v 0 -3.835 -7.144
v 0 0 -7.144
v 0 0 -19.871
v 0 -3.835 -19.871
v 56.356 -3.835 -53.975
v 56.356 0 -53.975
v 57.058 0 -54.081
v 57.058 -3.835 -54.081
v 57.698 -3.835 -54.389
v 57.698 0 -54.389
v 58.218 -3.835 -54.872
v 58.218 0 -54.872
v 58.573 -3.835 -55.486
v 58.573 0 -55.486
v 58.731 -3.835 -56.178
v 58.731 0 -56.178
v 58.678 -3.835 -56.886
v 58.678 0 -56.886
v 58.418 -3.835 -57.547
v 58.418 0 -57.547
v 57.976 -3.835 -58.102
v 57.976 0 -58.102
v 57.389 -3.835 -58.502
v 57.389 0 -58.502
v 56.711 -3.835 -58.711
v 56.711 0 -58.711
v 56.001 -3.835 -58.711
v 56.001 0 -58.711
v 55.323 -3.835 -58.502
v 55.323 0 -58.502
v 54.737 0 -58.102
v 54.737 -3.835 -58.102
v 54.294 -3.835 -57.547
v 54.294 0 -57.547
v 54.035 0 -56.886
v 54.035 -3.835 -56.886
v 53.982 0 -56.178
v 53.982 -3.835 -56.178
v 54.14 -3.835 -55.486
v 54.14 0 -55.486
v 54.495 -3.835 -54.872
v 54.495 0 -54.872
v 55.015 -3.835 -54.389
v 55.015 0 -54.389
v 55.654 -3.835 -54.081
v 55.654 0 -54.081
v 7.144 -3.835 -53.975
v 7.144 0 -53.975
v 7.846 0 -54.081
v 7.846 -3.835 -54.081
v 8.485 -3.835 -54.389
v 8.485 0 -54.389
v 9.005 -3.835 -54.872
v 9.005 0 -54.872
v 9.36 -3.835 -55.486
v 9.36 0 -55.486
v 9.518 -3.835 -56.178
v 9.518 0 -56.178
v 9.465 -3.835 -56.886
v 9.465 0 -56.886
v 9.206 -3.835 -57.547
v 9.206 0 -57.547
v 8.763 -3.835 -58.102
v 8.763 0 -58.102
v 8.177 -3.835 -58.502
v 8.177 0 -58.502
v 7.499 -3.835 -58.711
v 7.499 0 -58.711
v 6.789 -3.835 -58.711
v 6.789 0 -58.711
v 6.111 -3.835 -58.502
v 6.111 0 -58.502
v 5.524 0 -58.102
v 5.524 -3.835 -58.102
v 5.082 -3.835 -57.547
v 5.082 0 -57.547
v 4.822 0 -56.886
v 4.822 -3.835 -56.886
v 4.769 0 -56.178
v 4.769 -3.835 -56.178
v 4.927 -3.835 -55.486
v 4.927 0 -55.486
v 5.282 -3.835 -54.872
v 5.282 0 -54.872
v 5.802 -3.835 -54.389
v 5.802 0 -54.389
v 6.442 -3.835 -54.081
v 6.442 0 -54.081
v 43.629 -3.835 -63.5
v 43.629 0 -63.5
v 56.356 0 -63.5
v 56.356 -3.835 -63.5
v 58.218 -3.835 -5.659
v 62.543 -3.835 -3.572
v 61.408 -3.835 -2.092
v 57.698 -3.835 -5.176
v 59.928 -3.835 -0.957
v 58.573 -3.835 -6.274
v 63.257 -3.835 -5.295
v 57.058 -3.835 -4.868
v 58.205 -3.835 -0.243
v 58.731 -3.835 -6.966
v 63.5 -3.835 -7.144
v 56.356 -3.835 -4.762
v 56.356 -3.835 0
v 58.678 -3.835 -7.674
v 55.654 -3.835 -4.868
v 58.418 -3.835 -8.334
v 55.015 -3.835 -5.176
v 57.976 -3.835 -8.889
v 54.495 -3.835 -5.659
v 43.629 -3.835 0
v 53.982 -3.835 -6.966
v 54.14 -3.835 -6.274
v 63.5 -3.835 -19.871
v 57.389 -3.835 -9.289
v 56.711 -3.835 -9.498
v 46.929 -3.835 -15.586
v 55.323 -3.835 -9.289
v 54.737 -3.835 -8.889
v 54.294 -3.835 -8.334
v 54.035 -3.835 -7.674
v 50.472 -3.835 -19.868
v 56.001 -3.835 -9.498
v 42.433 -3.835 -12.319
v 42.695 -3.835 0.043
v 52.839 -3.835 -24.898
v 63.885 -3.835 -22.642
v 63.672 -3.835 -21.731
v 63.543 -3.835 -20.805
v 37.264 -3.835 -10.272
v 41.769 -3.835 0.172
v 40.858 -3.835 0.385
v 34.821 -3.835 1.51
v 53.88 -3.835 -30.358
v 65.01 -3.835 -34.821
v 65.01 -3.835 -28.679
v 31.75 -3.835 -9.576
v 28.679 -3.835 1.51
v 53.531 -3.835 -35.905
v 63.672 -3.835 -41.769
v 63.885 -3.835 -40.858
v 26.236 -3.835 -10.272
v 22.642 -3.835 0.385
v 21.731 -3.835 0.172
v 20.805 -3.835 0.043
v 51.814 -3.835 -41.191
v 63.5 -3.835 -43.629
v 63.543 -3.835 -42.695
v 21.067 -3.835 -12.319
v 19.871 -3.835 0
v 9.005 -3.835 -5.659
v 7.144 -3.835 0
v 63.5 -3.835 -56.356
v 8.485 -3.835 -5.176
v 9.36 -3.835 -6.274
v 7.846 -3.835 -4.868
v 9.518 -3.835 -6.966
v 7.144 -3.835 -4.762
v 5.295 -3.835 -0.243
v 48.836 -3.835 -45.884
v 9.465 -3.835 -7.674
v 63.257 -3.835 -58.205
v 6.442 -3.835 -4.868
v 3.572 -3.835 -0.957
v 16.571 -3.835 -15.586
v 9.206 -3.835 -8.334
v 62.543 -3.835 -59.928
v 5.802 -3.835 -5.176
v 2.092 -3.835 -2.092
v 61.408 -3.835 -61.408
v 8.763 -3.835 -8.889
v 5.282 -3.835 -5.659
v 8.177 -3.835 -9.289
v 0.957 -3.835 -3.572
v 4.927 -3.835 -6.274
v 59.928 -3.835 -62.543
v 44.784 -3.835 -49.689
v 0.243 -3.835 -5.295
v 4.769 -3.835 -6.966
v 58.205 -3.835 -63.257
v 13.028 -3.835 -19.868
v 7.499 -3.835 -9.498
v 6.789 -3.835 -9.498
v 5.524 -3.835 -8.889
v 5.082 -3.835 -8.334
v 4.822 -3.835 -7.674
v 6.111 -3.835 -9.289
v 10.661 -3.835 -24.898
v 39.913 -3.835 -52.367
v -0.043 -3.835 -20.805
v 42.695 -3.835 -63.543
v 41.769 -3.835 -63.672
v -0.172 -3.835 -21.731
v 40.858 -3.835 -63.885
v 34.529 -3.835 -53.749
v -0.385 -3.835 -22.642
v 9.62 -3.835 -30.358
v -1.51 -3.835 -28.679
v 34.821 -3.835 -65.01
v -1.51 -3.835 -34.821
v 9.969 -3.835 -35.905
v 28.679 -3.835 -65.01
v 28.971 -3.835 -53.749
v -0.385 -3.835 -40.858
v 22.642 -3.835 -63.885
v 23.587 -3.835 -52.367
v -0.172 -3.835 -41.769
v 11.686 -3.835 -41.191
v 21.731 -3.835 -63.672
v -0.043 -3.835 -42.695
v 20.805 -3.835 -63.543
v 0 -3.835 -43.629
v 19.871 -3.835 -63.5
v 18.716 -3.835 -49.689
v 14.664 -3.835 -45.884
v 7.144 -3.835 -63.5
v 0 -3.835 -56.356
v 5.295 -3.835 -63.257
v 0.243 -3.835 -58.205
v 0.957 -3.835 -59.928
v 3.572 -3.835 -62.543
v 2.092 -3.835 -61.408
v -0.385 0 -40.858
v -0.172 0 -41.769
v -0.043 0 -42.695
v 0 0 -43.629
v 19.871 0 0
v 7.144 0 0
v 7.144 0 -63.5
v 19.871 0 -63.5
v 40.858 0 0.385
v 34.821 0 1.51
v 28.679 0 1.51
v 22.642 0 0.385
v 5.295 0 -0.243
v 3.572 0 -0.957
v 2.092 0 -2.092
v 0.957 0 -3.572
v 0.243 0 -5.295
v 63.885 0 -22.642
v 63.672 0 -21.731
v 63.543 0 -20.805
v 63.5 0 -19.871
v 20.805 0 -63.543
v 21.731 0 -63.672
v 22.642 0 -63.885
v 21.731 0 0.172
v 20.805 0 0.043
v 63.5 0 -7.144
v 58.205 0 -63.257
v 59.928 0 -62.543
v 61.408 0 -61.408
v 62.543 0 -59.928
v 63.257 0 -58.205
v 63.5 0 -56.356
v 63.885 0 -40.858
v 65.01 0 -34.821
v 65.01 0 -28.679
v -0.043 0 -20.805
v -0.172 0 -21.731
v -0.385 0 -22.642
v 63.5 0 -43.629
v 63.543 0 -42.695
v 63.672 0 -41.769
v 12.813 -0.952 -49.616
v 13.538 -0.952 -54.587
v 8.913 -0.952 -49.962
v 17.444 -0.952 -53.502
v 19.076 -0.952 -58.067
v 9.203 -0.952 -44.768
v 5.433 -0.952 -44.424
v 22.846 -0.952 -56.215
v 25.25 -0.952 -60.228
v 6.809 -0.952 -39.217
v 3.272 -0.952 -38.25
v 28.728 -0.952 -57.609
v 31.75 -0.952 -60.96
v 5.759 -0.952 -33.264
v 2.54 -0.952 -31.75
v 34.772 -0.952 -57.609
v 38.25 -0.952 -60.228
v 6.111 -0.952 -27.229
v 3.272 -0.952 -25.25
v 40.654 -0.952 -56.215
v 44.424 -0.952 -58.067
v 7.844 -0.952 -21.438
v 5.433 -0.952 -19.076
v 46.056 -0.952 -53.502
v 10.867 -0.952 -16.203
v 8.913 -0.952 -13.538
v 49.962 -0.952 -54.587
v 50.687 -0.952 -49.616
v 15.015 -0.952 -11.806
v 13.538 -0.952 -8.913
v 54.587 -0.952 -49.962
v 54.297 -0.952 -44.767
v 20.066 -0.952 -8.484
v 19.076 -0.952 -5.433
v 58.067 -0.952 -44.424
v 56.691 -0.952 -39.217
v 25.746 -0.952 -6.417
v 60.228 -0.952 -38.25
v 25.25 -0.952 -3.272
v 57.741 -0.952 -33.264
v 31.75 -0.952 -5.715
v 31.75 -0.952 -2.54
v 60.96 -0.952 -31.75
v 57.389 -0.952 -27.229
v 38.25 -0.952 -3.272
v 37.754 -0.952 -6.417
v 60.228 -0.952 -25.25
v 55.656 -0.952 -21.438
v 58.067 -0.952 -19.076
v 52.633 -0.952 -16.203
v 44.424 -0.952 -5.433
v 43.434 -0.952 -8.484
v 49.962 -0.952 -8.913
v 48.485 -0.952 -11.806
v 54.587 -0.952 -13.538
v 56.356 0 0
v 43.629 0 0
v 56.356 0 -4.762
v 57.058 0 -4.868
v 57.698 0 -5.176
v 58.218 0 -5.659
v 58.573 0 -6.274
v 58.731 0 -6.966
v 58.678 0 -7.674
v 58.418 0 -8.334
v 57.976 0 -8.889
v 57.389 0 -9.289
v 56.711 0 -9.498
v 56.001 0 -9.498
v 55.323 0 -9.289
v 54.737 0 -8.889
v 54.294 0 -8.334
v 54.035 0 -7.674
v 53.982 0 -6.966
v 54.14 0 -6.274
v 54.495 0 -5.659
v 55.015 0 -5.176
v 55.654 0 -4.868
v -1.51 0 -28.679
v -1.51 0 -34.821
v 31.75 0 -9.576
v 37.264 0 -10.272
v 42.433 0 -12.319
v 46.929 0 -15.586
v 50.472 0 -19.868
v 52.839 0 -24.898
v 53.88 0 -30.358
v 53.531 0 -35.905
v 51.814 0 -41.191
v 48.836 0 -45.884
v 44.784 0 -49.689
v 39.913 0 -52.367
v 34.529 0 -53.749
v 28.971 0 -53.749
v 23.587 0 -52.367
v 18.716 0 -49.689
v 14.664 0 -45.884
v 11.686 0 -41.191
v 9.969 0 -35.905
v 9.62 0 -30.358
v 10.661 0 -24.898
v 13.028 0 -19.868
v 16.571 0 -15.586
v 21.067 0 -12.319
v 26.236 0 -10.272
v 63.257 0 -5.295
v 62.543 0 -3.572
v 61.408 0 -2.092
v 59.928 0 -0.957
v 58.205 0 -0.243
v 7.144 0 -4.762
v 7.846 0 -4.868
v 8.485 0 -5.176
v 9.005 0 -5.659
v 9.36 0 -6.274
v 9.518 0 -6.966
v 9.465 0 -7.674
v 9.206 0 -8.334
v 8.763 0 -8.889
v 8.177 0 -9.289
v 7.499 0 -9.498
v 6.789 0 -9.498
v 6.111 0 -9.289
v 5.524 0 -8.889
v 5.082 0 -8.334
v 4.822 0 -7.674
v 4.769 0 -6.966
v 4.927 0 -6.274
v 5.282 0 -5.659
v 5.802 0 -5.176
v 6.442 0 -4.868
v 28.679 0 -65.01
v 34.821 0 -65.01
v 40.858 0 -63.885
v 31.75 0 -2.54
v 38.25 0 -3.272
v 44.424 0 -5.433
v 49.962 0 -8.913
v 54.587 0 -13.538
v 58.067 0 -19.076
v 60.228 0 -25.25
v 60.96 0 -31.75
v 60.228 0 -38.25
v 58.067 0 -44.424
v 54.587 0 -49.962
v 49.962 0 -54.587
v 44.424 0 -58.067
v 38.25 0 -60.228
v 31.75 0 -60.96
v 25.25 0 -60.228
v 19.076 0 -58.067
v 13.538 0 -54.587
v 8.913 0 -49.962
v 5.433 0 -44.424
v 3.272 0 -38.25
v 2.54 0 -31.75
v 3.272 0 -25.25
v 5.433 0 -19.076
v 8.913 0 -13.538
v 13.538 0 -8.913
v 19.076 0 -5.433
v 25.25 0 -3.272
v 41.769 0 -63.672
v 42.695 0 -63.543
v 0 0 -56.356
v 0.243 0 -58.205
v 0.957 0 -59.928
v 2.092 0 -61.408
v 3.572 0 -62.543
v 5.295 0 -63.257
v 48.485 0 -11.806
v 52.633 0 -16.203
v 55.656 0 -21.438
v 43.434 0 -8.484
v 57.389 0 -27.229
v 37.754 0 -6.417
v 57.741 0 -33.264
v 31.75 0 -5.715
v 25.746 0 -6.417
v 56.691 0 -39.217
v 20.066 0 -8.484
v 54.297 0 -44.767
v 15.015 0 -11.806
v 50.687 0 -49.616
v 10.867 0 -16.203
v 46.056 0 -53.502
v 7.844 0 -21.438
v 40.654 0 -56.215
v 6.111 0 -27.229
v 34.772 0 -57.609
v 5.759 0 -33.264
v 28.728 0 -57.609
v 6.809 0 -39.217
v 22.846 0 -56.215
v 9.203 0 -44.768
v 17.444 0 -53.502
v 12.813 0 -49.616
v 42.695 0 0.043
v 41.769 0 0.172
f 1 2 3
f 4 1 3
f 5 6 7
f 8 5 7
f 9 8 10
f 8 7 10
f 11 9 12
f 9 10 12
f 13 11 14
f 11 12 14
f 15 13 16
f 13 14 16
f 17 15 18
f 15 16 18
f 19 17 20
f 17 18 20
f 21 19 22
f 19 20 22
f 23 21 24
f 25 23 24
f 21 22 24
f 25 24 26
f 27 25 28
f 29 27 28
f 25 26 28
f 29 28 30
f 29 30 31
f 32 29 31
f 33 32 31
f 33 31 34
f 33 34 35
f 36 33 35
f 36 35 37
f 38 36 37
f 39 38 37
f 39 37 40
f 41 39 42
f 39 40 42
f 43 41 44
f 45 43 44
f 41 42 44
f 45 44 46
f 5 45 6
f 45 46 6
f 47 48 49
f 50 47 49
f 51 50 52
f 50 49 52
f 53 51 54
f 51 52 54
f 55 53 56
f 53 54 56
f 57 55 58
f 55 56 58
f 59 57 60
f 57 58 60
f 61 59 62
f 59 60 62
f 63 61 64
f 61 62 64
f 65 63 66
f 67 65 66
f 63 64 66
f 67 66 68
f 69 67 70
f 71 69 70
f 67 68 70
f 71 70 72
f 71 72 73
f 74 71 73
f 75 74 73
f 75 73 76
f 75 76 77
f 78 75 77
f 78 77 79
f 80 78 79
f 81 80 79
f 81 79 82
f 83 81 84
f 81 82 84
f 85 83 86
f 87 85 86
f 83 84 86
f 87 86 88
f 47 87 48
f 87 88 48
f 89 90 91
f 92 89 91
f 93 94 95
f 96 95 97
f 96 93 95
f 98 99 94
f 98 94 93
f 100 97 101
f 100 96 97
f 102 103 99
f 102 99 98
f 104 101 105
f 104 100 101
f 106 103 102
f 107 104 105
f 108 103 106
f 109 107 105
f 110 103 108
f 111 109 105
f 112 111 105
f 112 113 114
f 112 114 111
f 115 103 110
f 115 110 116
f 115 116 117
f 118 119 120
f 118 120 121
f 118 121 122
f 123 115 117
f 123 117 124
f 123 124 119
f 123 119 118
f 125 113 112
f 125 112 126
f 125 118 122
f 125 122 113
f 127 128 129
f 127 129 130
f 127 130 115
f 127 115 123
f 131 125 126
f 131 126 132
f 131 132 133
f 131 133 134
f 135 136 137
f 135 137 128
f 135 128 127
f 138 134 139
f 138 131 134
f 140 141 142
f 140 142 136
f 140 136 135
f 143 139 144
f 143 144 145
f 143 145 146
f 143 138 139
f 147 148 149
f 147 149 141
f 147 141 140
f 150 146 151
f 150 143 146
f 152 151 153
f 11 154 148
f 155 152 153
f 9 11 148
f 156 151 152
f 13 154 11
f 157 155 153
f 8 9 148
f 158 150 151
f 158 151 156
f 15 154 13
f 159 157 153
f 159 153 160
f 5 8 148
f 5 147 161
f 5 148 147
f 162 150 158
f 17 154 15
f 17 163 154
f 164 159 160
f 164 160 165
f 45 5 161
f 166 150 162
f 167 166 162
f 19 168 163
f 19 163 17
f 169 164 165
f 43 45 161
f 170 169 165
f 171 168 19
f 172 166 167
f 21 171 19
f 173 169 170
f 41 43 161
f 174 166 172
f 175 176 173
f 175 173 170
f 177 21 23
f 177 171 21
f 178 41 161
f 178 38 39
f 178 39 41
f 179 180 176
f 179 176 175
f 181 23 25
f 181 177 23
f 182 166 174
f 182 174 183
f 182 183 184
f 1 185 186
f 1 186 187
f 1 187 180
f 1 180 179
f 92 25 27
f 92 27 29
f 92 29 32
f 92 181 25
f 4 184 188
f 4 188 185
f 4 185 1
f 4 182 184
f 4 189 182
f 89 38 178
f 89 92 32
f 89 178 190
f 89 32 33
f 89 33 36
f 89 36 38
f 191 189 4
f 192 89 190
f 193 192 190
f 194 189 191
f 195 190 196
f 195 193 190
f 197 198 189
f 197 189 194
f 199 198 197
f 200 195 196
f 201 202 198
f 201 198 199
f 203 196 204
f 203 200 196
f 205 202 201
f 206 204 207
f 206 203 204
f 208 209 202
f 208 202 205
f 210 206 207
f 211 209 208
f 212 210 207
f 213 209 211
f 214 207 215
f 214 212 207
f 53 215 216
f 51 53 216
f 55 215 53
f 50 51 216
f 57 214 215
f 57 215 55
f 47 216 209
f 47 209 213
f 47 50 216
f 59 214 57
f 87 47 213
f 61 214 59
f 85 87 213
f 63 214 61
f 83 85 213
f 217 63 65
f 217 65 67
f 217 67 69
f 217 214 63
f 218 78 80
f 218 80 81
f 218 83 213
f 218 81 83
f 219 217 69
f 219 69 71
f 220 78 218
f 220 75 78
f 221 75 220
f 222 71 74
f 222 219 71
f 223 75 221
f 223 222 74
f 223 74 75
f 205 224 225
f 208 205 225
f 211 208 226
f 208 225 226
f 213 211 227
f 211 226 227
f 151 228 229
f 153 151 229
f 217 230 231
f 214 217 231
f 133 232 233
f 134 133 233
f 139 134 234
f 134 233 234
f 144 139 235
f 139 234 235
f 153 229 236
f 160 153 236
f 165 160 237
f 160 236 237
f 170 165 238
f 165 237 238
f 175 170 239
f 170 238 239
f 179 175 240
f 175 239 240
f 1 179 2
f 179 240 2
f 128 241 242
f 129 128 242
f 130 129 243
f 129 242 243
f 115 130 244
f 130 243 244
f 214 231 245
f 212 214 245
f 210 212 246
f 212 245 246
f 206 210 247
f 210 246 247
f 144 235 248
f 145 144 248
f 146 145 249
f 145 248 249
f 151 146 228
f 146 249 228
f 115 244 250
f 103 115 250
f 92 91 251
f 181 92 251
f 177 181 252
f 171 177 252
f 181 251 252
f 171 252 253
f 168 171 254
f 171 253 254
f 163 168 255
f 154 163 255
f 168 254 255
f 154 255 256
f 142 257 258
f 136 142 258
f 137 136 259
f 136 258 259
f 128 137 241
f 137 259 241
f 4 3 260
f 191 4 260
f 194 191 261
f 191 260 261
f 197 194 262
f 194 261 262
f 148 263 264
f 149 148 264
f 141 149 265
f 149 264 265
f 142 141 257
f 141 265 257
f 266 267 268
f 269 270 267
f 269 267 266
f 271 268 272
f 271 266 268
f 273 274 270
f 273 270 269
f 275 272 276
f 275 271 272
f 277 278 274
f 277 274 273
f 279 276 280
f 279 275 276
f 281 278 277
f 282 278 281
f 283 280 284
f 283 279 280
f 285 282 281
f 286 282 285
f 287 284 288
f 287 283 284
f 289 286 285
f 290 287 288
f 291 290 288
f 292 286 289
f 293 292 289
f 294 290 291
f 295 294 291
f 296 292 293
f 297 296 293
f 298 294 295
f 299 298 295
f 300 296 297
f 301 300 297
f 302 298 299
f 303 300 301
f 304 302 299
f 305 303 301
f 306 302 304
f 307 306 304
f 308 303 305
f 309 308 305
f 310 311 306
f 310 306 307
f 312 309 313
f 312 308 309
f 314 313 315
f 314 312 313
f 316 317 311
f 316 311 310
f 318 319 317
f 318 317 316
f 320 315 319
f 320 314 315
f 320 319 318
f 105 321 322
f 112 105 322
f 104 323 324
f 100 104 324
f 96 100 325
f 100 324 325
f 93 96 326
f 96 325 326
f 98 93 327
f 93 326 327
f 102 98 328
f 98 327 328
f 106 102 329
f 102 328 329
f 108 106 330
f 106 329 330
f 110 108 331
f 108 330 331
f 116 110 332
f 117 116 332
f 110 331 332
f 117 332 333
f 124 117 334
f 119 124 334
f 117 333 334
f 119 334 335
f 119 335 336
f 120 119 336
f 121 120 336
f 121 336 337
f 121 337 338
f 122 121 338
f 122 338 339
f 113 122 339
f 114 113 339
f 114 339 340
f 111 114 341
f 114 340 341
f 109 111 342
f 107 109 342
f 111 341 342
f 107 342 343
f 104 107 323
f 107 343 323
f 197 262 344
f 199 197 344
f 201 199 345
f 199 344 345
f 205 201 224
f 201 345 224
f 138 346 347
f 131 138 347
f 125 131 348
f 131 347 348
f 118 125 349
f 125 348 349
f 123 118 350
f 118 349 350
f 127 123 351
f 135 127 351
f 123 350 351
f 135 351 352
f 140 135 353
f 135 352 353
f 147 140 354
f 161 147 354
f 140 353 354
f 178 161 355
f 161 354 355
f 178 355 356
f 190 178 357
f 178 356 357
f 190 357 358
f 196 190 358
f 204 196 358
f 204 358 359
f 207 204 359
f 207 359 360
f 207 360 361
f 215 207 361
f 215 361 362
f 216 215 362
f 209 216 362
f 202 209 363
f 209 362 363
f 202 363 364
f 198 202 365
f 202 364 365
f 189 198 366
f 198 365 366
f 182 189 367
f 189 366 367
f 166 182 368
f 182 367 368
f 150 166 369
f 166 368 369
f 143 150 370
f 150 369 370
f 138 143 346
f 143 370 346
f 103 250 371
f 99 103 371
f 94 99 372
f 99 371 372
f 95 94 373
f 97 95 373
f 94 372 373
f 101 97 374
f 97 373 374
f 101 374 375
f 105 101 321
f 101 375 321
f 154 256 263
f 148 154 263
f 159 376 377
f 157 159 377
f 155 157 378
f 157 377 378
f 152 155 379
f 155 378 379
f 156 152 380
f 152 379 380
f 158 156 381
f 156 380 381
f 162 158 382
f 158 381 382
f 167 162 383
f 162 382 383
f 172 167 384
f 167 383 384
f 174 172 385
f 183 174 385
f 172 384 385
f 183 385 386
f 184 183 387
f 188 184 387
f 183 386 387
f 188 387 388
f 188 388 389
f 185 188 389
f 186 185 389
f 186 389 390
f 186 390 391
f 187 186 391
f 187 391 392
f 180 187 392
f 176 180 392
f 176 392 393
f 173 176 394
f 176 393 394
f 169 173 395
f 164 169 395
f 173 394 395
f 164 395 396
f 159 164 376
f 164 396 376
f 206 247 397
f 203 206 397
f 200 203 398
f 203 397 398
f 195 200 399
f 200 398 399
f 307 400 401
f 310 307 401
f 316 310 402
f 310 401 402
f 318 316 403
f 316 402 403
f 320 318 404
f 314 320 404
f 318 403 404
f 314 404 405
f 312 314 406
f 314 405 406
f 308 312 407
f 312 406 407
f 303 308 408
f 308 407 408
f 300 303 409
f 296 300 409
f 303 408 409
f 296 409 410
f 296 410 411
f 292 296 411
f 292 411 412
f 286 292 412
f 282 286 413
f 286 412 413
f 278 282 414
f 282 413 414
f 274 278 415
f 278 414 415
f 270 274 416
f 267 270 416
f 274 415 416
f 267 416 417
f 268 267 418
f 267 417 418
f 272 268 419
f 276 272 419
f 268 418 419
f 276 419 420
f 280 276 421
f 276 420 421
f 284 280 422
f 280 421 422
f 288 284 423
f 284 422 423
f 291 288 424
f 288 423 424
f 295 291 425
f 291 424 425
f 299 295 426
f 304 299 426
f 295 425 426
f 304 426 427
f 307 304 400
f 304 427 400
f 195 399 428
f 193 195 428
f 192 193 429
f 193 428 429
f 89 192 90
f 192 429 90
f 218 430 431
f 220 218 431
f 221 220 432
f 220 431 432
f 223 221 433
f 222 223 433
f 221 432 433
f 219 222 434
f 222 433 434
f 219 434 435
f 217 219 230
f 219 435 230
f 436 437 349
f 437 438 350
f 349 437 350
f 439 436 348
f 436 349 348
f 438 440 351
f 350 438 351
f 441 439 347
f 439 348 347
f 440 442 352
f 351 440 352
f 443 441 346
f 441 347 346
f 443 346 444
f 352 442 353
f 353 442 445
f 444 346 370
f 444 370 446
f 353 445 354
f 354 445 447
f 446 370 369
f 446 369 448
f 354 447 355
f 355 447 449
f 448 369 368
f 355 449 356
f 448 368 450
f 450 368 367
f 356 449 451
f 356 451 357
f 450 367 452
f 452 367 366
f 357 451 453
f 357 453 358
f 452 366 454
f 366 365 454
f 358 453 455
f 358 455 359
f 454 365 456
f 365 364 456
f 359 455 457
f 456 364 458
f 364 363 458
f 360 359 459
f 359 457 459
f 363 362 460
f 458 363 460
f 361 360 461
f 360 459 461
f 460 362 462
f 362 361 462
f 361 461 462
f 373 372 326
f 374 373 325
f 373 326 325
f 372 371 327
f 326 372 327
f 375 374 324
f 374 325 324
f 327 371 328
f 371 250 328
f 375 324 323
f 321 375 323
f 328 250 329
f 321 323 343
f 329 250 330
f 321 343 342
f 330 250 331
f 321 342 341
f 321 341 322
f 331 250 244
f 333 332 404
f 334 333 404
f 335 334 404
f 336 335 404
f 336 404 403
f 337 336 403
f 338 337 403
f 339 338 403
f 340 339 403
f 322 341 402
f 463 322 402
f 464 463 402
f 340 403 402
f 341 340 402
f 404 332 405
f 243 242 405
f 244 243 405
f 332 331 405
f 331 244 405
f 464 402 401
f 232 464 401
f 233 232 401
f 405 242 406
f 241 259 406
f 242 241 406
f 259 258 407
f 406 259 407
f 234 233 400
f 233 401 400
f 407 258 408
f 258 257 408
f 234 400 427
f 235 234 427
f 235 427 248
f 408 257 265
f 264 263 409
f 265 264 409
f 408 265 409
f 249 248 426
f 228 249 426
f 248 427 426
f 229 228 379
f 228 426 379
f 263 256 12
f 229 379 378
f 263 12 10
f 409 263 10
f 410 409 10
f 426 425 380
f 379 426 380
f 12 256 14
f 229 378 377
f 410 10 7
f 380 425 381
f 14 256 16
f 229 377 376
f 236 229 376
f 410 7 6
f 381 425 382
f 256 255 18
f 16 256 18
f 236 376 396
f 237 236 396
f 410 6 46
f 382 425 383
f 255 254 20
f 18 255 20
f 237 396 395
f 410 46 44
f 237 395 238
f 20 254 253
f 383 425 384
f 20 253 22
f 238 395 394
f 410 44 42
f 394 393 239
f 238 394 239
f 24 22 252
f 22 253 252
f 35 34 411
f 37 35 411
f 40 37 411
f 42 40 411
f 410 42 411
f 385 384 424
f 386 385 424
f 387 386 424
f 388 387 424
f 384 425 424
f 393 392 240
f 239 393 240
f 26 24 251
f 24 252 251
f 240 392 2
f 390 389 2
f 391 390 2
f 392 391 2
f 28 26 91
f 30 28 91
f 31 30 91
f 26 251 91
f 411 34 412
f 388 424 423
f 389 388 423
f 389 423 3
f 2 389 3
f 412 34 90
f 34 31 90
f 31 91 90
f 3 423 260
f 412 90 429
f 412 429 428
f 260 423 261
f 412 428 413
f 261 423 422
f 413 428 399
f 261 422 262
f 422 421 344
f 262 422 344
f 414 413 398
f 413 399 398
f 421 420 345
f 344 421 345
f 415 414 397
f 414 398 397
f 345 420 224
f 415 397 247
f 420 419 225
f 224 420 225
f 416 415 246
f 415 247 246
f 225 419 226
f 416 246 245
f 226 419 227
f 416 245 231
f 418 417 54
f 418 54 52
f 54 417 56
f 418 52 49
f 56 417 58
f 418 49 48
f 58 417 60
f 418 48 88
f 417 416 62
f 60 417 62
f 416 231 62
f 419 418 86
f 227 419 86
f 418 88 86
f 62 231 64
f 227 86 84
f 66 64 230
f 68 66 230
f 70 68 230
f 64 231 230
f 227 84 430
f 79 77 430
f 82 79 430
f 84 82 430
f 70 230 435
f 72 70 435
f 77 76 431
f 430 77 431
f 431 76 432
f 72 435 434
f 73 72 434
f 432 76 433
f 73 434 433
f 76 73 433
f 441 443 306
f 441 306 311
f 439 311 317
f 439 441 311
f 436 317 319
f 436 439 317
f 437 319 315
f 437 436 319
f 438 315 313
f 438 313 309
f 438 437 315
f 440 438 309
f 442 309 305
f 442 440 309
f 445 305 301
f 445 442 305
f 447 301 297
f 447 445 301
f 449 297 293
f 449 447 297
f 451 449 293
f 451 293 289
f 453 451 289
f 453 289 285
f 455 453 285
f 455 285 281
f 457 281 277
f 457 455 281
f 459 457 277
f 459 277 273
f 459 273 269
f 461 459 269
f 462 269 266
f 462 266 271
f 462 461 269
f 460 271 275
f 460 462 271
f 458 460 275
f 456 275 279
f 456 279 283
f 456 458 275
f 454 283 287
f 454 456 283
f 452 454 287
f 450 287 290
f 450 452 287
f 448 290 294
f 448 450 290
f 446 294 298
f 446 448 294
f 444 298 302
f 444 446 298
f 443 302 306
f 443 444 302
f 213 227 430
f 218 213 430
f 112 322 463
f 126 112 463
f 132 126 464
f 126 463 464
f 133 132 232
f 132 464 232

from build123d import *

# Parameters (mm, degrees)
SKETCH1_R           = 22.1742
SKETCH1_R_2         = 2.38125
BOSS_EXTRUDE1_DEPTH = 3.8354
SKETCH2_R           = 29.21
SKETCH2_R_2         = 26.035
CUT_EXTRUDE1_DEPTH  = 0.9525


with BuildPart() as part:
    # Sketch1 → Boss-Extrude1 (new body)
    with BuildSketch(Plane(origin=(0, 0, 0), x_dir=(1, 0, 0), z_dir=(0, 1, 0))):
        with BuildLine():
            Line((0, 43.62908334), (0, 56.35625))
            ThreePointArc((0, 56.35625), (2.092355932, 61.407644068), (7.14375, 63.5))
            Line((7.14375, 63.5), (19.87091666, 63.5))
            ThreePointArc((19.87091666, 63.5), (21.269548228, 63.596728676), (22.641548343, 63.885072886))
            ThreePointArc((22.641548343, 63.885072886), (31.75, 65.151), (40.858451657, 63.885072886))
            ThreePointArc((40.858451657, 63.885072886), (42.230451772, 63.596728676), (43.62908334, 63.5))
            Line((43.62908334, 63.5), (56.35625, 63.5))
            ThreePointArc((56.35625, 63.5), (61.407644068, 61.407644068), (63.5, 56.35625))
            Line((63.5, 56.35625), (63.5, 43.62908334))
            ThreePointArc((63.5, 43.62908334), (63.596728676, 42.230451772), (63.885072886, 40.858451657))
            ThreePointArc((63.885072886, 40.858451657), (65.151, 31.75), (63.885072886, 22.641548343))
            ThreePointArc((63.885072886, 22.641548343), (63.596728676, 21.269548228), (63.5, 19.87091666))
            Line((63.5, 19.87091666), (63.5, 7.14375))
            ThreePointArc((63.5, 7.14375), (61.407644068, 2.092355932), (56.35625, 0))
            Line((56.35625, 0), (43.62908334, 0))
            ThreePointArc((43.62908334, 0), (42.230451772, -0.096728676), (40.858451657, -0.385072886))
            ThreePointArc((40.858451657, -0.385072886), (31.75, -1.651), (22.641548343, -0.385072886))
            ThreePointArc((22.641548343, -0.385072886), (21.269548228, -0.096728676), (19.87091666, 0))
            Line((19.87091666, 0), (7.14375, 0))
            ThreePointArc((7.14375, 0), (2.092355932, 2.092355932), (0, 7.14375))
            Line((0, 7.14375), (0, 19.87091666))
            ThreePointArc((0, 19.87091666), (-0.096728676, 21.269548228), (-0.385072886, 22.641548343))
            ThreePointArc((-0.385072886, 22.641548343), (-1.651, 31.75), (-0.385072886, 40.858451657))
            ThreePointArc((-0.385072886, 40.858451657), (-0.096728676, 42.230451772), (0, 43.62908334))
        make_face()
        with Locations(Location((31.75, 31.75, 0), (0, 0, 270))):
            Circle(SKETCH1_R, mode=Mode.SUBTRACT)
        with Locations(Location((56.35625, 56.35625, 0), (0, 0, 270))):
            Circle(SKETCH1_R_2, mode=Mode.SUBTRACT)
        with Locations(Location((56.35625, 7.14375, 0), (0, 0, 270))):
            Circle(SKETCH1_R_2, mode=Mode.SUBTRACT)
        with Locations(Location((7.14375, 7.14375, 0), (0, 0, 270))):
            Circle(SKETCH1_R_2, mode=Mode.SUBTRACT)
        with Locations(Location((7.14375, 56.35625, 0), (0, 0, 270))):
            Circle(SKETCH1_R_2, mode=Mode.SUBTRACT)
    extrude(amount=-BOSS_EXTRUDE1_DEPTH)

    # Sketch2 → Cut-Extrude1 (cut)
    with BuildSketch(Plane(origin=(0, 0, 0), x_dir=(1, 0, 0), z_dir=(0, 1, 0))):
        with Locations(Location((31.75, 31.75, 0), (0, 0, 270))):
            Circle(SKETCH2_R)
        with Locations(Location((31.75, 31.75, 0), (0, 0, 270))):
            Circle(SKETCH2_R_2, mode=Mode.SUBTRACT)
    extrude(amount=-CUT_EXTRUDE1_DEPTH, mode=Mode.SUBTRACT)


solid = part.part
